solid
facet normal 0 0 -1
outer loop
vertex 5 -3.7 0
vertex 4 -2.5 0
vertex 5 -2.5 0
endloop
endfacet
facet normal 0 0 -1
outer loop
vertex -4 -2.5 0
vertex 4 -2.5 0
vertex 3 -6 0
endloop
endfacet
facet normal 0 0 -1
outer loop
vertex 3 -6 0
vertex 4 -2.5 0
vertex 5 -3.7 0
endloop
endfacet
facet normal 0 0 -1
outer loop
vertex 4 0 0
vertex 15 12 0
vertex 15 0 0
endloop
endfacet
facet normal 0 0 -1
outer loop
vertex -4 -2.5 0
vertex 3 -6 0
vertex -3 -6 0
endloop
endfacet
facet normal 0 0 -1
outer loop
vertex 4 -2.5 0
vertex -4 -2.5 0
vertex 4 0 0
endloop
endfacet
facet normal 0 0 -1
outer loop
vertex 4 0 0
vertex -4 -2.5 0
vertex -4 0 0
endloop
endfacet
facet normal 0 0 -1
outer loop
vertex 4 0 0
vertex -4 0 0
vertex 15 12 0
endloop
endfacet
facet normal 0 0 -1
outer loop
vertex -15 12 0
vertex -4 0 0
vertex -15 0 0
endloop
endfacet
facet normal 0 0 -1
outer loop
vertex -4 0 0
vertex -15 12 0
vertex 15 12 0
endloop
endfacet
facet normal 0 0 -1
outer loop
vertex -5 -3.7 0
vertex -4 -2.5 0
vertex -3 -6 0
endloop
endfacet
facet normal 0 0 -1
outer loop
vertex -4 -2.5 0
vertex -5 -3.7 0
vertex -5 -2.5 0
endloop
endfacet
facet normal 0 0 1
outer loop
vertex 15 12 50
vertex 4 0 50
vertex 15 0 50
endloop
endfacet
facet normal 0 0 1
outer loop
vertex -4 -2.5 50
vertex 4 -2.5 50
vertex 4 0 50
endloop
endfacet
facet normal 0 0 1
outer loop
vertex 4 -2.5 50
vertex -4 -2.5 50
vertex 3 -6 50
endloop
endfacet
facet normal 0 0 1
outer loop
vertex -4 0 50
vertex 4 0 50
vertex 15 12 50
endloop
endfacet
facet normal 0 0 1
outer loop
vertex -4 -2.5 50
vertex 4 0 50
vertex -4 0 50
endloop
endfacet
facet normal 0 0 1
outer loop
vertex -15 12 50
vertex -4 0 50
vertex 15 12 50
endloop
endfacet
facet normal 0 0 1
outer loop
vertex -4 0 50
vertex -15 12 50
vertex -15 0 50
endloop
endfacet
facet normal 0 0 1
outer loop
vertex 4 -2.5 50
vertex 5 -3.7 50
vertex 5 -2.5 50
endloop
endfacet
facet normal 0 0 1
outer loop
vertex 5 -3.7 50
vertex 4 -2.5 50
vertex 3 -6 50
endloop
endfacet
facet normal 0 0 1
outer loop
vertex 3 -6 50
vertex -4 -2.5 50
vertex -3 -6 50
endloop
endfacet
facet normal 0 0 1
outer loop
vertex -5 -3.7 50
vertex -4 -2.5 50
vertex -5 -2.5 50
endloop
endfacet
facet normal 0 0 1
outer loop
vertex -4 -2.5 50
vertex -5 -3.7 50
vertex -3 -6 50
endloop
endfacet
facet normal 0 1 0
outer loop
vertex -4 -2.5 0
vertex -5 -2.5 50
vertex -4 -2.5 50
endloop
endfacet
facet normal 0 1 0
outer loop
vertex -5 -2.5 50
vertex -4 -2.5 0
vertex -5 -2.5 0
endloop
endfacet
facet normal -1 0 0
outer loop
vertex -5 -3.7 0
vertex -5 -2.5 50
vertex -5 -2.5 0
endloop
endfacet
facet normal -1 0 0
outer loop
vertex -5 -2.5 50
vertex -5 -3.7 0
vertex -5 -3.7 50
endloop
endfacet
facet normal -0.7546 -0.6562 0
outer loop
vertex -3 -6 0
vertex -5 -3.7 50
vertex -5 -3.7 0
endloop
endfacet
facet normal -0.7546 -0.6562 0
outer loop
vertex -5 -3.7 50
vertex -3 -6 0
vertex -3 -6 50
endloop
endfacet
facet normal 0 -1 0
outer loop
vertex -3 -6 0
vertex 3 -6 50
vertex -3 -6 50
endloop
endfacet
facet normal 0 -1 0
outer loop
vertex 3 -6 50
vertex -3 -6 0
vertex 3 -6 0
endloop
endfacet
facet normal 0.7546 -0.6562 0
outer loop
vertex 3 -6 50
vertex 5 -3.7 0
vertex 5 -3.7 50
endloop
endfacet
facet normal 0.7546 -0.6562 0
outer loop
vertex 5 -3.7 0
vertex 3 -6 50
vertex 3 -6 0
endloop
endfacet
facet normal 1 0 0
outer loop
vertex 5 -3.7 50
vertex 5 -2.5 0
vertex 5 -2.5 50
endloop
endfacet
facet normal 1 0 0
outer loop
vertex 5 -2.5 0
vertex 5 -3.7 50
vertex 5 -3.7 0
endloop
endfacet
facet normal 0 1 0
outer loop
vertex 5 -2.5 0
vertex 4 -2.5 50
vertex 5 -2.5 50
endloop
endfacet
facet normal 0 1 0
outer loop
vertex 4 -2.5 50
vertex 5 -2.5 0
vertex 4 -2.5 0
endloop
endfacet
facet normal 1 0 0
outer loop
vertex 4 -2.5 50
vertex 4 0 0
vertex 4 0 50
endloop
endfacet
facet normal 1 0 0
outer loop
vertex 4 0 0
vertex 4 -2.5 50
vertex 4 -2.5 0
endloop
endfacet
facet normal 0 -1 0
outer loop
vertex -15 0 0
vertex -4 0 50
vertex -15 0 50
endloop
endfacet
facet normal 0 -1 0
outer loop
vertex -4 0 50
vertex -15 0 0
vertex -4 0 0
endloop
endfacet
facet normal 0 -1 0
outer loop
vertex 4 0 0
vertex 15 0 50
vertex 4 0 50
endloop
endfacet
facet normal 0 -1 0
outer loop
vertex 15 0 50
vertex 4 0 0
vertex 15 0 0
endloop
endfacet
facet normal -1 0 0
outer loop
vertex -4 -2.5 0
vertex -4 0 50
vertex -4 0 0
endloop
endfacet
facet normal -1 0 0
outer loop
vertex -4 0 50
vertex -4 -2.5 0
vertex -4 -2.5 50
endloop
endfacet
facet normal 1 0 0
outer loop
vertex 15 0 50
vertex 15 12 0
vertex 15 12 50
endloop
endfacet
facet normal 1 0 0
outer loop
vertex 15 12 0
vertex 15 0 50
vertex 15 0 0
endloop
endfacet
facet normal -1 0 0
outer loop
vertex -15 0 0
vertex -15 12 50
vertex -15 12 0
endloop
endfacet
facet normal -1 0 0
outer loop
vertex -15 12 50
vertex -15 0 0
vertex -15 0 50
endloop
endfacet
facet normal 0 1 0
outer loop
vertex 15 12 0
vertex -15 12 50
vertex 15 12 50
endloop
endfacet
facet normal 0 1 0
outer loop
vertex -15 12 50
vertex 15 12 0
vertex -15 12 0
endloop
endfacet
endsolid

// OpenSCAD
// Feet for Prusa i3 MK3
// (c) 2018, Phil Dubach
//
// Creative Commons License
// Feet for Prusa i3 MK3 by Phil Dubach is licensed under a Creative
// Commons Attribution-NonCommercial-ShareAlike 4.0 International License.
// Based on a work at https://github.com/phildubach/PrusaFeet.

// Length of the foot
LENGTH = 50;

module T3030_flex(height) {
    slit_uw = 8;
    slit_lw = 6;
    slit_d = 6;
    wall = 2.5;
    t_w = 10;
    t_h = 1.2;
    vertices = [[0,0], [slit_uw/2,0], [slit_uw/2, -wall], [t_w/2, -wall], [t_w/2, -(wall+t_h)], [slit_lw/2, -slit_d], [0, -slit_d], [0,0]];
    linear_extrude(height=height) {
        polygon(vertices);
        mirror([1,0,0]) polygon(vertices);
    }
}

T3030_flex(LENGTH);
translate([-15,0,0]) cube([30, 12, LENGTH]);
